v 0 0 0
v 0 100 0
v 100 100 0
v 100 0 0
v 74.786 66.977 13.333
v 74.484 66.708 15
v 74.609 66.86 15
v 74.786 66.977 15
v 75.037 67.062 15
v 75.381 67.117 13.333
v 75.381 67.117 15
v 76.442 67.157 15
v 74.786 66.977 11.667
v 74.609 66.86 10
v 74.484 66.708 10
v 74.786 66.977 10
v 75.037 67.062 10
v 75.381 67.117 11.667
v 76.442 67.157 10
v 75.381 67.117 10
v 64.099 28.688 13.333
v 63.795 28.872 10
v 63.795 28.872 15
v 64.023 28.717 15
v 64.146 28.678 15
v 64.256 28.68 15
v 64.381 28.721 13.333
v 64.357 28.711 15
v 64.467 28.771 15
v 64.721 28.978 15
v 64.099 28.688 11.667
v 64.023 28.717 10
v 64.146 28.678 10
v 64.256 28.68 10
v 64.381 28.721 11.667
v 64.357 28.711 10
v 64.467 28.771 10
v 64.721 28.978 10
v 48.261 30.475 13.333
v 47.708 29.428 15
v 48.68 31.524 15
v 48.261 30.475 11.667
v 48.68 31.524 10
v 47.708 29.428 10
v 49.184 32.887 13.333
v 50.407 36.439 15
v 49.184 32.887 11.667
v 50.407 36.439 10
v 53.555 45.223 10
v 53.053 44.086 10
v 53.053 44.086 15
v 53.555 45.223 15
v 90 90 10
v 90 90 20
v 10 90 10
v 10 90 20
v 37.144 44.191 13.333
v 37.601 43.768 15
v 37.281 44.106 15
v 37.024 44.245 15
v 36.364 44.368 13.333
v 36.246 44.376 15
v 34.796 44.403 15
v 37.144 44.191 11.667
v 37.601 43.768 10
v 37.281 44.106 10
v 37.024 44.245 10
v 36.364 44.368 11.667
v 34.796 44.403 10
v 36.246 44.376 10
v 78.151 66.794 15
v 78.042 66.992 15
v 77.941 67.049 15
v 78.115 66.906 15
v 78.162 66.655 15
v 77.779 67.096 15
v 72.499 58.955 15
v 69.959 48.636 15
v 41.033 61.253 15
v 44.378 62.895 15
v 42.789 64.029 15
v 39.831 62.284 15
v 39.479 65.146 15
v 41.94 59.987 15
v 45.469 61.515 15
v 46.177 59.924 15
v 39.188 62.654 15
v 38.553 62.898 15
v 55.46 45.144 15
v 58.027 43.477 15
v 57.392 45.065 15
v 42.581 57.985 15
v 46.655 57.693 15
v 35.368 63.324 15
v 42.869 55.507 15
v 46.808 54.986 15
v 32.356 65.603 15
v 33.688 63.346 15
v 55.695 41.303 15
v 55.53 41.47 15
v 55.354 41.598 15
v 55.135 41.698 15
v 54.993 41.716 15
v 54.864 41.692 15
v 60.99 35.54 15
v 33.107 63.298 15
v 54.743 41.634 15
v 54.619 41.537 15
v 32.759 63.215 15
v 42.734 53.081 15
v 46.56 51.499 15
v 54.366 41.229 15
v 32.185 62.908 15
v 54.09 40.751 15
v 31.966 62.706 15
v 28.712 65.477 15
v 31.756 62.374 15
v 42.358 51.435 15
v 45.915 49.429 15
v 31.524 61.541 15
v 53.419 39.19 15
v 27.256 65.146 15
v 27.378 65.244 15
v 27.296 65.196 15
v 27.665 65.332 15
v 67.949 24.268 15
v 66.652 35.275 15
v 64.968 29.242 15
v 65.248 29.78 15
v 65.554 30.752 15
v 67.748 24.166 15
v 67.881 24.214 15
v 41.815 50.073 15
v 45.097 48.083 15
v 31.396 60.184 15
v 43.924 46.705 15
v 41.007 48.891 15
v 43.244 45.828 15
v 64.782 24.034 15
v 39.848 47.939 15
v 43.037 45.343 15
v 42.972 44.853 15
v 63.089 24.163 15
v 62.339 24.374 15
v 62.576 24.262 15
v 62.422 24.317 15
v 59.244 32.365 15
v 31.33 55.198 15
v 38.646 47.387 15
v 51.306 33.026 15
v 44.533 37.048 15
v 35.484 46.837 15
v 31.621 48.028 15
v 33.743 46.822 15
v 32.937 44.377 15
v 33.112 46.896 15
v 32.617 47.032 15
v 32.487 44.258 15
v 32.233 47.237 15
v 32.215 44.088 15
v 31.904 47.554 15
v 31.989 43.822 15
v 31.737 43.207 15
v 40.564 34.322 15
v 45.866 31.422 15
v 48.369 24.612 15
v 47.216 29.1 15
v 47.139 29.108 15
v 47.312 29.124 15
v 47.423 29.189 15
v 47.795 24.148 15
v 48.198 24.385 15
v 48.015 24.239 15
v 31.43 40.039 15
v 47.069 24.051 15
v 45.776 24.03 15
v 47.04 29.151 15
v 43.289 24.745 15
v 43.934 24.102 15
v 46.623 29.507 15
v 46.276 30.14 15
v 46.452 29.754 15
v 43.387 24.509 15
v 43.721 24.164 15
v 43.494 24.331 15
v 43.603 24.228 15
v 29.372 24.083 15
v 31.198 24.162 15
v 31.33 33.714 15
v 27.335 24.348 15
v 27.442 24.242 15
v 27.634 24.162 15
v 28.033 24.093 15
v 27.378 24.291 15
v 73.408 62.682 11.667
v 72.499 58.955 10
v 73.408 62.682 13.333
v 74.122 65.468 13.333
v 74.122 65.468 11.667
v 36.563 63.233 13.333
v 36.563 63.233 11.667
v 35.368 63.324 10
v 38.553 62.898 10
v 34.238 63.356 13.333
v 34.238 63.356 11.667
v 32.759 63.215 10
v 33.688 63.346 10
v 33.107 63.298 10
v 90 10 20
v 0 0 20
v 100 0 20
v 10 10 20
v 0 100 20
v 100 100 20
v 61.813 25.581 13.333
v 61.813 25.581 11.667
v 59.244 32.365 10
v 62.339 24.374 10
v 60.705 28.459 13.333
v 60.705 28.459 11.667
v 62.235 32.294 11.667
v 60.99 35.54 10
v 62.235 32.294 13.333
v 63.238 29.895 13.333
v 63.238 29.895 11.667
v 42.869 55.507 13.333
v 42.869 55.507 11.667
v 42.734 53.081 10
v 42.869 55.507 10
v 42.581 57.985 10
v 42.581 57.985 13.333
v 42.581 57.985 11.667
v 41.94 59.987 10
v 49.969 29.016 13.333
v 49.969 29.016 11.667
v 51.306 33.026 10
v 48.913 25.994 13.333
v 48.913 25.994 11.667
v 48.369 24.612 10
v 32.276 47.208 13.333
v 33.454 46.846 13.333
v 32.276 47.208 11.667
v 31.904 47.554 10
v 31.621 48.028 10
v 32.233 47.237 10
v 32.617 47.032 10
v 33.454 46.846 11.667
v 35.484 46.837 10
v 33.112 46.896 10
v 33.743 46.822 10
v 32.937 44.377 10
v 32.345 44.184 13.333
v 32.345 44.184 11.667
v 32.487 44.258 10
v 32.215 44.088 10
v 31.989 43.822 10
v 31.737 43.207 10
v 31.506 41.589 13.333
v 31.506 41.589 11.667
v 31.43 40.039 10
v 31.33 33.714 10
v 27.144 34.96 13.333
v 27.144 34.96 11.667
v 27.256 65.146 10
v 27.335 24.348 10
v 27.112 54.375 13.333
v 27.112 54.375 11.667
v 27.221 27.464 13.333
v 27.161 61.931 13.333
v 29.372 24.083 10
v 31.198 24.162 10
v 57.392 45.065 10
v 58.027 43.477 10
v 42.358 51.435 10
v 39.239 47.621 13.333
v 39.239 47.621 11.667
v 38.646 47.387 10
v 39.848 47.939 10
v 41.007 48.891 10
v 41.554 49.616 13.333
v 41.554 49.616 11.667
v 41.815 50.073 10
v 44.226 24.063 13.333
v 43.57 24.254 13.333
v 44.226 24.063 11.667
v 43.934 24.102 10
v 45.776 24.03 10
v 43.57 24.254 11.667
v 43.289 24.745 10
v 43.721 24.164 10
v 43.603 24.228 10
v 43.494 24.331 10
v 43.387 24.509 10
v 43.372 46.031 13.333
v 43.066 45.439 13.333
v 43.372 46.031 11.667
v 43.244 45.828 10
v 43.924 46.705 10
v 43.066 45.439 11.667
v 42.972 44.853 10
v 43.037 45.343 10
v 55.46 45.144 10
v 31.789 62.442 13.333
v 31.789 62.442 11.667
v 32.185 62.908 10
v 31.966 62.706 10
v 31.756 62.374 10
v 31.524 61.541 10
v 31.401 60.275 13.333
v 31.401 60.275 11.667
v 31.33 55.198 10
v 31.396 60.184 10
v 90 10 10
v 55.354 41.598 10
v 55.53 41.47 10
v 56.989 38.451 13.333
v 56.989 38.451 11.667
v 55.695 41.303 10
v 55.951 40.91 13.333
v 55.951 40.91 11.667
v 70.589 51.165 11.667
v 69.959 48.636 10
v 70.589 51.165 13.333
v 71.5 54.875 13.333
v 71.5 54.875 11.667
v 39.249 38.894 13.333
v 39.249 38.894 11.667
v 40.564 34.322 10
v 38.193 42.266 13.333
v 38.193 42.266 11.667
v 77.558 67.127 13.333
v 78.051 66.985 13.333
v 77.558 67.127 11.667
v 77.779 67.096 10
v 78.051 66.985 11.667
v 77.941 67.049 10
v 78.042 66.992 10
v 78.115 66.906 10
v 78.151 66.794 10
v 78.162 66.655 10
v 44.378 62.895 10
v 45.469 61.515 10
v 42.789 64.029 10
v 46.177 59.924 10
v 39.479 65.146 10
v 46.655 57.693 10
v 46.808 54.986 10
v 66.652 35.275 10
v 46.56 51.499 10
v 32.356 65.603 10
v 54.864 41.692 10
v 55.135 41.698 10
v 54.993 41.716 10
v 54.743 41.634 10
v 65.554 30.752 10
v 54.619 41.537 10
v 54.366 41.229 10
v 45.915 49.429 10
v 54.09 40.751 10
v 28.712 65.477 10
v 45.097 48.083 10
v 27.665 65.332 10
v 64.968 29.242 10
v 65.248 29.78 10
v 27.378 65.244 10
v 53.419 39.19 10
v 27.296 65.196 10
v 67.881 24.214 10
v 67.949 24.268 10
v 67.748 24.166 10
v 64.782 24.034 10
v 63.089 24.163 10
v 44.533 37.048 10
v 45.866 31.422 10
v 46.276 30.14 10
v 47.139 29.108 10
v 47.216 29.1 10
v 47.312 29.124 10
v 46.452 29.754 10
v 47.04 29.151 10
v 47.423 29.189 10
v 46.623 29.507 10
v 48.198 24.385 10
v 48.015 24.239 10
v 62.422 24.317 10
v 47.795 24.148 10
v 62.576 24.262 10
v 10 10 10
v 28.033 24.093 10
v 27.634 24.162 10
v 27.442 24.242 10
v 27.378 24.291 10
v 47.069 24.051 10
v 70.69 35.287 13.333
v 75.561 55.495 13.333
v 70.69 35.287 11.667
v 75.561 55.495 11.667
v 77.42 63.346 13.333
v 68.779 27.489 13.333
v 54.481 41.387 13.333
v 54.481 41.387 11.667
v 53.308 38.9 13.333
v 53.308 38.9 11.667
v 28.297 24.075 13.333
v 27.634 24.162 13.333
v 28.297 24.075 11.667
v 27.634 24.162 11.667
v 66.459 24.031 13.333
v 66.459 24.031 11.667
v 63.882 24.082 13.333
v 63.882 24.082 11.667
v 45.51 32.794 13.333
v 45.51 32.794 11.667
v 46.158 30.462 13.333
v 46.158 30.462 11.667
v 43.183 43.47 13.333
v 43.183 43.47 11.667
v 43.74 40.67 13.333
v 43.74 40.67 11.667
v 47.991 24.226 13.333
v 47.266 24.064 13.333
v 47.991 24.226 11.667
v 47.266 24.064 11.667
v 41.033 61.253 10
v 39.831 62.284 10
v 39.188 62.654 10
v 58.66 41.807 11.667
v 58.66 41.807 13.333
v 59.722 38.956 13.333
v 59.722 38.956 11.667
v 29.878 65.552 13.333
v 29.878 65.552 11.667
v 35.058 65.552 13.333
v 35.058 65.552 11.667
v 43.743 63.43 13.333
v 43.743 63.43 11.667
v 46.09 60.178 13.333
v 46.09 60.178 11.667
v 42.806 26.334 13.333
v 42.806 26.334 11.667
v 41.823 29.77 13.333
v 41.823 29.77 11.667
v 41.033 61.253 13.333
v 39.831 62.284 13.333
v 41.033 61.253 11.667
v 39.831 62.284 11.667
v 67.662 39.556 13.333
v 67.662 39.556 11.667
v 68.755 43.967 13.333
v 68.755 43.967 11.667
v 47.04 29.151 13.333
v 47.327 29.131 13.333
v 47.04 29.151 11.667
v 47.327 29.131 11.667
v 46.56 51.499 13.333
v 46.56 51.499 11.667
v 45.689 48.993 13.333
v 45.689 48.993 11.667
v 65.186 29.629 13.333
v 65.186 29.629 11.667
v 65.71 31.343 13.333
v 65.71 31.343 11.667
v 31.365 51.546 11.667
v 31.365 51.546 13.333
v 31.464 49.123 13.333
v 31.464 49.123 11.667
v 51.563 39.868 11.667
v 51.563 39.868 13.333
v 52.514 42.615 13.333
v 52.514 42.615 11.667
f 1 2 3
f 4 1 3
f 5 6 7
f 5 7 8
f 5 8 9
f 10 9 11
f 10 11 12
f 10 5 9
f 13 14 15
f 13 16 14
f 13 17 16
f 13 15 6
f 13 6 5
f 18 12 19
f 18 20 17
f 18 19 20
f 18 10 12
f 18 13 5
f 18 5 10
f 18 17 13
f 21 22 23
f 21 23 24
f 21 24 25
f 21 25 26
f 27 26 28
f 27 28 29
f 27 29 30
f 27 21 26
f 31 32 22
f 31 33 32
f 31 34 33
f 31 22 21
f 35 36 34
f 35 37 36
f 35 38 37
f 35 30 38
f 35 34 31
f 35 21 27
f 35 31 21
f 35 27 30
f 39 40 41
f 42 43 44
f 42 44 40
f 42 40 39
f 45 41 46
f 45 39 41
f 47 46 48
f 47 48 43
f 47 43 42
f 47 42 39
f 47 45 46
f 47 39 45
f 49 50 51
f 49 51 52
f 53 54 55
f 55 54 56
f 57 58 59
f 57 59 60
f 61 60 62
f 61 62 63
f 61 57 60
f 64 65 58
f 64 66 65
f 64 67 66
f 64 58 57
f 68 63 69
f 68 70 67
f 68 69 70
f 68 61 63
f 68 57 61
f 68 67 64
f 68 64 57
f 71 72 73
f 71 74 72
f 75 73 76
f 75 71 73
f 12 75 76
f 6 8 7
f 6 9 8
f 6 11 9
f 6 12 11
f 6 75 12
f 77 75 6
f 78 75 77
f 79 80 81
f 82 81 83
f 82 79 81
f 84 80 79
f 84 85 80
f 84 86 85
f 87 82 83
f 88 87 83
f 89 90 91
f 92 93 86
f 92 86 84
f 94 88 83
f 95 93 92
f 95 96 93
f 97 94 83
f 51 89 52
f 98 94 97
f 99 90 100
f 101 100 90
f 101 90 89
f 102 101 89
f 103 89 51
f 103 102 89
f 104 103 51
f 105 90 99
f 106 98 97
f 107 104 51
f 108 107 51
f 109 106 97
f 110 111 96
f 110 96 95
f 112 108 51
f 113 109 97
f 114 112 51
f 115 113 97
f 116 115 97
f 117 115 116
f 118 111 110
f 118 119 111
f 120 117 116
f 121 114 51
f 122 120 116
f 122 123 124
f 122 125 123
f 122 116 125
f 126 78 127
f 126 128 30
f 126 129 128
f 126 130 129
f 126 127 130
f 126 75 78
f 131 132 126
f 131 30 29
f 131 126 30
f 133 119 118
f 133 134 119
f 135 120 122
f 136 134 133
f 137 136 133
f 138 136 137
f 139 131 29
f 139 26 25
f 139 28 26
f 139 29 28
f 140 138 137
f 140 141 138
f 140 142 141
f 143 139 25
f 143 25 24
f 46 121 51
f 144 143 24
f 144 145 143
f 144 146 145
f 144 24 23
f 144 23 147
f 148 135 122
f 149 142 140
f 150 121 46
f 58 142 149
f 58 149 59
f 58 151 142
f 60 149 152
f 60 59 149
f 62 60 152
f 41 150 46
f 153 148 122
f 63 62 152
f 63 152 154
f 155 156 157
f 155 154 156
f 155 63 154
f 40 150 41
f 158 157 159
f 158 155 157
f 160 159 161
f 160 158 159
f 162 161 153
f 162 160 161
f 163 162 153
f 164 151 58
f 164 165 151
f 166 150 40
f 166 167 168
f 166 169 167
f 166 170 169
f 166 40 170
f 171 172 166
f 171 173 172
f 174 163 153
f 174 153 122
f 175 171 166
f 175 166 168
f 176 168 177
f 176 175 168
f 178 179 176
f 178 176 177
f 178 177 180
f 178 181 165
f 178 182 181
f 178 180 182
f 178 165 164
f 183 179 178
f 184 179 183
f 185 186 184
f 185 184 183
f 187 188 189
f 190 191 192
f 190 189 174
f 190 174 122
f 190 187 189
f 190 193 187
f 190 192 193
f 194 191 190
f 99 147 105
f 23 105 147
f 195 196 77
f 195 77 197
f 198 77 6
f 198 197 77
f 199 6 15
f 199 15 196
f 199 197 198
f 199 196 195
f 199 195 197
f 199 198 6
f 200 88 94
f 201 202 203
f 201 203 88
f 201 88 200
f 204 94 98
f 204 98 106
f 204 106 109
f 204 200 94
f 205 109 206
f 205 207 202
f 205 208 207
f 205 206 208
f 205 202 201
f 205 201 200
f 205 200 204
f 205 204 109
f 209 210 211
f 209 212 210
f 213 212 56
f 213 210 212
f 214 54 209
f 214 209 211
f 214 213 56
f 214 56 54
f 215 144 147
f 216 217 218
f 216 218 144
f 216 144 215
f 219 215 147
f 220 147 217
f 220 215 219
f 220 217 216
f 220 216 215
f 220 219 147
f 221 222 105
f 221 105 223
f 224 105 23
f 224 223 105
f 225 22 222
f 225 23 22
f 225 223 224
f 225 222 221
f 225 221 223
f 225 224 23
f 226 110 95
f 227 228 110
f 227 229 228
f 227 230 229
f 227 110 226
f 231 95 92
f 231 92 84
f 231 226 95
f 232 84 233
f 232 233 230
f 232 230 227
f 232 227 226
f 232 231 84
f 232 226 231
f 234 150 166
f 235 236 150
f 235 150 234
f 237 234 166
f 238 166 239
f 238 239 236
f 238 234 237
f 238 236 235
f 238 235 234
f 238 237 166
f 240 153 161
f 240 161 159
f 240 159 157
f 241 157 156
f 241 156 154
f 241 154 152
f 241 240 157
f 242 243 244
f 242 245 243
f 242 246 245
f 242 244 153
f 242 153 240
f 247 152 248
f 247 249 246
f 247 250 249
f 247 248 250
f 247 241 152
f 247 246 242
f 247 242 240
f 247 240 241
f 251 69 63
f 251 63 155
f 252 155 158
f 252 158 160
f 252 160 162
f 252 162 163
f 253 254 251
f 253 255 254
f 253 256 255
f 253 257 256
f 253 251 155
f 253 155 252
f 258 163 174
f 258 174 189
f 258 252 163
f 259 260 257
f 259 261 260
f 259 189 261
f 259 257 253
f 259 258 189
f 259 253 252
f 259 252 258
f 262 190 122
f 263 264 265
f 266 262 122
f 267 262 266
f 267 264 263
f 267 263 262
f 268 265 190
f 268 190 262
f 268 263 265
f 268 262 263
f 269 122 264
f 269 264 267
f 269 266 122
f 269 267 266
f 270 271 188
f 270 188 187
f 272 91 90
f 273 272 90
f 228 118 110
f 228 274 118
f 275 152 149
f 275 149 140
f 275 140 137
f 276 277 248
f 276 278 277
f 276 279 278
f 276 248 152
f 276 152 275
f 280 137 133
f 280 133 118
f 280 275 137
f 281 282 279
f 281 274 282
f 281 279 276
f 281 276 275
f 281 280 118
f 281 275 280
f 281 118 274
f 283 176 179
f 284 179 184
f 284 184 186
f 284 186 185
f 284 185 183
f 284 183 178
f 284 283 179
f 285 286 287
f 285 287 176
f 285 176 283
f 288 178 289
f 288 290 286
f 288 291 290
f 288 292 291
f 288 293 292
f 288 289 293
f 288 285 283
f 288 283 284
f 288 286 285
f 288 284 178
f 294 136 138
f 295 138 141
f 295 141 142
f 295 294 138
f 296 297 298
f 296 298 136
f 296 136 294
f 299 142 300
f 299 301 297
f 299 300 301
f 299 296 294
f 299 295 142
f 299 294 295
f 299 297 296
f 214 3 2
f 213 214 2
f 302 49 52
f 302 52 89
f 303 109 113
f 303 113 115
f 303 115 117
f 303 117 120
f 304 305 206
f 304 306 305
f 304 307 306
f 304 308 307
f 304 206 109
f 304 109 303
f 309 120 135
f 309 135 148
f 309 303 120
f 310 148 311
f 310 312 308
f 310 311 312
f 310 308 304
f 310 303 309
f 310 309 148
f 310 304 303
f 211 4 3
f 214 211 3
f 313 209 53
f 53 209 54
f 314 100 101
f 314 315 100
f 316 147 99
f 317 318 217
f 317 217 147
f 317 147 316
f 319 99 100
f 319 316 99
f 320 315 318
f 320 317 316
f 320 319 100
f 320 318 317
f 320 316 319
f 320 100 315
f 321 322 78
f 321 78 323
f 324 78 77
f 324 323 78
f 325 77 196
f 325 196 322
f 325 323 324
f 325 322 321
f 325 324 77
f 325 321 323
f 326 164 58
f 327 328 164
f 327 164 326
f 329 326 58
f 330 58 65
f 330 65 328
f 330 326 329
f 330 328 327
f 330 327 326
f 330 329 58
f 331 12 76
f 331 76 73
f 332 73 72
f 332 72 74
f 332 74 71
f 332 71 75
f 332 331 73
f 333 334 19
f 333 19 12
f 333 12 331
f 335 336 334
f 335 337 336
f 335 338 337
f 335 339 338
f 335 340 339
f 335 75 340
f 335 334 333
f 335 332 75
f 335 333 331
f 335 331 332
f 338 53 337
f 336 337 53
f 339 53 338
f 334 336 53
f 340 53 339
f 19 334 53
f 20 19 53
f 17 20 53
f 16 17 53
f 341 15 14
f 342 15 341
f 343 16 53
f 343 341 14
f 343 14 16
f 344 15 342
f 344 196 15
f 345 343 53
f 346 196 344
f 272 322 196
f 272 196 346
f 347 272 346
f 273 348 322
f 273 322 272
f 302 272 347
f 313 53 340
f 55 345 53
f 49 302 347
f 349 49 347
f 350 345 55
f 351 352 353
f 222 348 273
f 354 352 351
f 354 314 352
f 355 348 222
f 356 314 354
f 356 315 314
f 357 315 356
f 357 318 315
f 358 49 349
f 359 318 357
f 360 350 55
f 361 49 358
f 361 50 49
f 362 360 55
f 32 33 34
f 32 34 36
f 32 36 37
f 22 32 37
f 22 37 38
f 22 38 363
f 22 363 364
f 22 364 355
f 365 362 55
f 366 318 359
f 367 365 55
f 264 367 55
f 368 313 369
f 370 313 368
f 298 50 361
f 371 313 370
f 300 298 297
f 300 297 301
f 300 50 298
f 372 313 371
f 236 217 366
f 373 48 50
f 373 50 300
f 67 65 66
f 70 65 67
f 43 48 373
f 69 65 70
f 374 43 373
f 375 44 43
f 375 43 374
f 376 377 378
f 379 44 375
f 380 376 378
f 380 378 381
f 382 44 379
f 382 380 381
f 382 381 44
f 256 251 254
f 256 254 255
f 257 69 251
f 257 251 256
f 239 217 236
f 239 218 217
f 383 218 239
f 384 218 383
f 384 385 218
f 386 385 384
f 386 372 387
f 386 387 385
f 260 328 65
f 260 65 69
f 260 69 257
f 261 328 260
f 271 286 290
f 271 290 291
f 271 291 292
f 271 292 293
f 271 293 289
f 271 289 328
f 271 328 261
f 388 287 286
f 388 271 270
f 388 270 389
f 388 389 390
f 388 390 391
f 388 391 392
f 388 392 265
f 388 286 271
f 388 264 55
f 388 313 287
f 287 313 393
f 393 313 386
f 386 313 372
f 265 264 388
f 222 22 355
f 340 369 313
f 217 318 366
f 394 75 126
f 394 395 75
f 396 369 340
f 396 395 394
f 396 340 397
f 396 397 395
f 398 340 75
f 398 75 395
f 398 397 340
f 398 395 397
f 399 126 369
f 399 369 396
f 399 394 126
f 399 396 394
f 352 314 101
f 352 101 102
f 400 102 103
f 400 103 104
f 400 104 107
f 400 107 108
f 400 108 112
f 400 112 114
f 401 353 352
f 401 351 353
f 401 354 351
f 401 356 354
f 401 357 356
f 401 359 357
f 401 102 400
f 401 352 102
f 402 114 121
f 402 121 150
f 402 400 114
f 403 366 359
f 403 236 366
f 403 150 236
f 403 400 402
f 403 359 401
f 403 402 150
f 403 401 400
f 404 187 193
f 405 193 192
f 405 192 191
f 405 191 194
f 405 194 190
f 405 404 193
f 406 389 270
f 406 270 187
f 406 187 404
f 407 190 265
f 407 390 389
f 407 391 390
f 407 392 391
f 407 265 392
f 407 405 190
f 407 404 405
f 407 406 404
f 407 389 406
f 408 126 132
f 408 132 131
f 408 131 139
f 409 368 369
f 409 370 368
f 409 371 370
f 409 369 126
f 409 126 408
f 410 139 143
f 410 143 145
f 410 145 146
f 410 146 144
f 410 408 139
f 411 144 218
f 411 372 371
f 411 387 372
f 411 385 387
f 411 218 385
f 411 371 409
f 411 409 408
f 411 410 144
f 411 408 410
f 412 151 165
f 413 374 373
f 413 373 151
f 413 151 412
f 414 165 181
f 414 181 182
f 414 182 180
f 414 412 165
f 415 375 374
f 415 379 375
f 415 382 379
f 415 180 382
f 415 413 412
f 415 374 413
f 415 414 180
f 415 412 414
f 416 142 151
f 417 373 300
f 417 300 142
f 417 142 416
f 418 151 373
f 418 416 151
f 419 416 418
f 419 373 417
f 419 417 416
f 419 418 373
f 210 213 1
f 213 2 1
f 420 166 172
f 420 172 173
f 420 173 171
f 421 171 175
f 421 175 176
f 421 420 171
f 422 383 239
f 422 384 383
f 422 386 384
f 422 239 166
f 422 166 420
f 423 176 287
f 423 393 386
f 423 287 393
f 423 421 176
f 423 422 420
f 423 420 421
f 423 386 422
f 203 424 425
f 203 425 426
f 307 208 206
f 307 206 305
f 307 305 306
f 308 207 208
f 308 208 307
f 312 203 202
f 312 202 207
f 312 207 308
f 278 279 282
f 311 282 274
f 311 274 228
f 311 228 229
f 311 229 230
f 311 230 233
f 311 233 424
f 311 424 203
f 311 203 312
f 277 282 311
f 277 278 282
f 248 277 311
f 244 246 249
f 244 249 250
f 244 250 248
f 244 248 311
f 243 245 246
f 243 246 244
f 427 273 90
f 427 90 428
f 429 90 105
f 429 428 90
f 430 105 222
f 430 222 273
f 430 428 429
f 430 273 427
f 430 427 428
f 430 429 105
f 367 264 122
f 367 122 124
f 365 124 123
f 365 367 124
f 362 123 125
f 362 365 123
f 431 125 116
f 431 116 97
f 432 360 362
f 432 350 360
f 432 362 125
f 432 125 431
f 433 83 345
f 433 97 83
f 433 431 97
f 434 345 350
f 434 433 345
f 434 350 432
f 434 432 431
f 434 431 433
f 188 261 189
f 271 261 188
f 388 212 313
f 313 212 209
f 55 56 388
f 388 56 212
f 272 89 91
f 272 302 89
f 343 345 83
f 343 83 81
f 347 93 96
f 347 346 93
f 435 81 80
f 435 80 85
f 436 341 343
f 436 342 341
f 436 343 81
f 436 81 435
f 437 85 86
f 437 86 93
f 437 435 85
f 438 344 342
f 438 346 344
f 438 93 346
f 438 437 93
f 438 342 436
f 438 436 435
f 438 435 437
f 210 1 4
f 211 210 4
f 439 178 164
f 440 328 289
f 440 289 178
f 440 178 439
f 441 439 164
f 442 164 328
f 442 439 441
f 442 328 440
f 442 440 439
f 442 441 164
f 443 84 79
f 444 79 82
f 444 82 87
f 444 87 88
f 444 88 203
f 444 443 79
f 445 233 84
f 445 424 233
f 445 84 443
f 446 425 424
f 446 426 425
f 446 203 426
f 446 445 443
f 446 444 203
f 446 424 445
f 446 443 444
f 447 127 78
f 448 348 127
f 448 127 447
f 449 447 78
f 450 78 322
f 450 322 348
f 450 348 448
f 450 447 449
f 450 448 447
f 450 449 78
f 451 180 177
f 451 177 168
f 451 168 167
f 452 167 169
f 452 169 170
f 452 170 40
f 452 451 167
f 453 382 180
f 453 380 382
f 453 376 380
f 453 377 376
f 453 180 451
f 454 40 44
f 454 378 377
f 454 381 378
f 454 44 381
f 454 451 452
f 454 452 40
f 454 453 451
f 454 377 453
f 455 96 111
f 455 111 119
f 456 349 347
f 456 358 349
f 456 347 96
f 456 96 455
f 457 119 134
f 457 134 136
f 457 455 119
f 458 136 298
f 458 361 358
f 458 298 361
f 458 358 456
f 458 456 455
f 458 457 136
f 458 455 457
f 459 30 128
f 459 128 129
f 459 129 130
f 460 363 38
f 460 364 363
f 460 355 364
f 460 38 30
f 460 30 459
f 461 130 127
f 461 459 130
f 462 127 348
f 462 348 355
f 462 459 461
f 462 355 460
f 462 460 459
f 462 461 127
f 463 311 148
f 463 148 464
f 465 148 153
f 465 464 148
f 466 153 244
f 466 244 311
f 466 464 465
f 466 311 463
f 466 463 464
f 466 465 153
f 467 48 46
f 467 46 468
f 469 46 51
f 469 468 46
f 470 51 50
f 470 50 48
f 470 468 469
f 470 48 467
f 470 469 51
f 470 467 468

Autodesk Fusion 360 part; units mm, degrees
sketch "Sketch2" plane through (0, 0, 0) normal (0, 0, 1) x (1, 0, 0)
  line L0 (0, 0) -> (100, 0)
  line L1 (100, 0) -> (100, 100)
  line L2 (100, 100) -> (0, 100)
  line L3 (0, 100) -> (0, 0)
extrude "Extrude3" add sketch "Sketch2" along normal blind 20
sketch "Sketch3" plane through (0, 0, 20) normal (0, 0, 1) x (-1, 0, 0)
  line L0 (0, -100) -> (0, 0)
  line L1 (0, 0) -> (-100, 0)
  line L2 (-100, 0) -> (-100, -100)
  line L3 (-100, -100) -> (0, -100)
  line L4 (-10, -10) -> (-90, -10)
  line L5 (-90, -10) -> (-90, -90)
  line L6 (-90, -90) -> (-10, -90)
  line L7 (-10, -90) -> (-10, -10)
extrude "Extrude4" cut sketch "Sketch3" against normal blind 10 contours L4 L5 L6 L7
sketch "Sketch4" plane through (0, 0, 10) normal (0, 0, 1) x (-1, 0, 0)
  line L0 (-10, -90) -> (-10, -10)
  line L1 (-10, -10) -> (-90, -10)
  line L2 (-90, -10) -> (-90, -90)
  line L3 (-90, -90) -> (-10, -90)
  spline S0 degree 3 poles (-75.4628, -68.295) (-73.8753, -68.1891) (-73.6636, -68.1362) (-73.5313, -67.6071) knots 0 0 0 0 1 1 1 1
  spline S1 degree 3 poles (-73.5313, -67.6071) (-72.473, -63.0562) (-68.3455, -46.4404) (-68.1338, -45.8583) knots 0 0 0 0 1 1 1 1
  spline S2 degree 3 poles (-68.1338, -45.8583) (-67.7369, -44.7471) (-64.7736, -31.8618) (-64.5355, -30.3008) knots 0 0 0 0 1 1 1 1
  spline S3 degree 3 poles (-64.5355, -30.3008) (-64.3503, -28.8456) (-64.0063, -28.8456) (-63.8211, -30.3273) knots 0 0 0 0 1 1 1 1
  spline S4 degree 3 poles (-63.8211, -30.3273) (-63.7417, -30.8829) (-62.4453, -34.6929) (-60.9371, -38.7939) knots 0 0 0 0 1 1 1 1
  line L4 (-60.9371, -38.7939) -> (-58.1855, -46.2552)
  line L5 (-58.1855, -46.2552) -> (-55.4073, -46.2552)
  line L6 (-55.4073, -46.2552) -> (-52.6028, -46.2552)
  line L7 (-52.6028, -46.2552) -> (-50.0363, -38.4764)
  spline S5 degree 3 poles (-50.0363, -38.4764) (-48.634, -34.2166) (-47.4698, -30.4596) (-47.4698, -30.1421) knots 0 0 0 0 1 1 1 1
  spline S6 degree 3 poles (-47.4698, -30.1421) (-47.4698, -29.0308) (-46.9936, -29.6129) (-46.8348, -30.9887) knots 0 0 0 0 1 1 1 1
  spline S7 degree 3 poles (-46.8348, -30.9887) (-46.729, -31.7296) (-45.9882, -35.275) (-45.1944, -38.8204) knots 0 0 0 0 1 1 1 1
  line L8 (-45.1944, -38.8204) -> (-43.7657, -45.2762)
  line L9 (-43.7657, -45.2762) -> (-44.824, -46.1758)
  spline S8 degree 3 poles (-44.824, -46.1758) (-46.3057, -47.4723) (-47.1523, -49.0333) (-47.6021, -51.4146) knots 0 0 0 0 1 1 1 1
  spline S9 degree 3 poles (-47.6021, -51.4146) (-48.0784, -53.7958) (-48.1048, -55.8066) (-47.708, -58.1614) knots 0 0 0 0 1 1 1 1
  spline S10 degree 3 poles (-47.708, -58.1614) (-47.1788, -61.5216) (-45.7765, -63.6648) (-43.263, -65.0141) knots 0 0 0 0 1 1 1 1
  spline S11 degree 3 poles (-43.263, -65.0141) (-40.8288, -66.3106) (-38.5269, -66.6281) (-31.833, -66.6281) knots 0 0 0 0 1 1 1 1
  line L10 (-31.833, -66.6281) -> (-26.0386, -66.6281)
  line L11 (-26.0386, -66.6281) -> (-26.0386, -44.8)
  line L12 (-26.0386, -44.8) -> (-26.0386, -22.9718)
  line L13 (-26.0386, -22.9718) -> (-29.2136, -22.9718)
  line L14 (-29.2136, -22.9718) -> (-32.3886, -22.9718)
  line L15 (-32.3886, -22.9718) -> (-32.3886, -33.2377)
  line L16 (-32.3886, -33.2377) -> (-32.3886, -43.4771)
  line L17 (-32.3886, -43.4771) -> (-34.6905, -43.4241)
  line L18 (-34.6905, -43.4241) -> (-36.9659, -43.3712)
  line L19 (-36.9659, -43.3712) -> (-39.7969, -33.2377)
  line L20 (-39.7969, -33.2377) -> (-42.6015, -23.1041)
  line L21 (-42.6015, -23.1041) -> (-45.803, -23.0248)
  line L22 (-45.803, -23.0248) -> (-48.978, -22.9454)
  line L23 (-48.978, -22.9454) -> (-51.6503, -30.83)
  spline S12 degree 3 poles (-51.6503, -30.83) (-53.1319, -35.1691) (-54.4019, -39.085) (-54.5078, -39.5083) knots 0 0 0 0 1 1 1 1
  spline S13 degree 3 poles (-54.5078, -39.5083) (-54.8517, -41.1752) (-54.9311, -41.3339) (-55.1692, -40.9371) knots 0 0 0 0 1 1 1 1
  spline S14 degree 3 poles (-55.1692, -40.9371) (-55.3015, -40.7254) (-55.4073, -40.355) (-55.4073, -40.0904) knots 0 0 0 0 1 1 1 1
  spline S15 degree 3 poles (-55.4073, -40.0904) (-55.4073, -39.8258) (-56.8096, -35.8835) (-58.503, -31.3062) knots 0 0 0 0 1 1 1 1
  line L24 (-58.503, -31.3062) -> (-61.5986, -22.9983)
  line L25 (-61.5986, -22.9983) -> (-65.144, -22.9189)
  spline S16 degree 3 poles (-65.144, -22.9189) (-67.1019, -22.866) (-68.7159, -22.8925) (-68.7688, -22.9718) knots 0 0 0 0 1 1 1 1
  spline S17 degree 3 poles (-68.7688, -22.9718) (-68.8482, -23.1306) (-79.749, -68.1098) (-79.749, -68.3214) knots 0 0 0 0 1 1 1 1
  spline S18 degree 3 poles (-79.749, -68.3214) (-79.749, -68.4802) (-79.0346, -68.4802) (-75.4628, -68.295) knots 0 0 0 0 1 1 1 1
  spline S19 degree 3 poles (-78.1615, -66.6546) (-78.1615, -66.0989) (-68.1603, -24.6123) (-67.9486, -24.2683) knots 0 0 0 0 1 1 1 1
  spline S20 degree 3 poles (-67.9486, -24.2683) (-67.7105, -23.8714) (-62.6569, -23.9773) (-62.3394, -24.3741) knots 0 0 0 0 1 1 1 1
  spline S21 degree 3 poles (-62.3394, -24.3741) (-62.1807, -24.5329) (-60.8048, -28.1577) (-59.2438, -32.3646) knots 0 0 0 0 1 1 1 1
  spline S22 degree 3 poles (-59.2438, -32.3646) (-56.1217, -40.8841) (-55.9894, -41.1752) (-55.3544, -41.5985) knots 0 0 0 0 1 1 1 1
  spline S23 degree 3 poles (-55.3544, -41.5985) (-54.4548, -42.1541) (-53.8992, -40.9635) (-51.3063, -33.026) knots 0 0 0 0 1 1 1 1
  spline S24 degree 3 poles (-51.3063, -33.026) (-49.904, -28.7398) (-48.5811, -24.9562) (-48.3694, -24.6123) knots 0 0 0 0 1 1 1 1
  spline S25 degree 3 poles (-48.3694, -24.6123) (-48.0255, -24.0831) (-47.7873, -24.0302) (-45.7765, -24.0302) knots 0 0 0 0 1 1 1 1
  spline S26 degree 3 poles (-45.7765, -24.0302) (-43.6069, -24.0302) (-43.554, -24.0566) (-43.2894, -24.7446) knots 0 0 0 0 1 1 1 1
  spline S27 degree 3 poles (-43.2894, -24.7446) (-43.1307, -25.1679) (-41.8871, -29.4541) (-40.5642, -34.3225) knots 0 0 0 0 1 1 1 1
  spline S28 degree 3 poles (-40.5642, -34.3225) (-39.1884, -39.2702) (-37.8919, -43.4241) (-37.6009, -43.7681) knots 0 0 0 0 1 1 1 1
  spline S29 degree 3 poles (-37.6009, -43.7681) (-37.1511, -44.3502) (-36.913, -44.4031) (-34.7963, -44.4031) knots 0 0 0 0 1 1 1 1
  spline S30 degree 3 poles (-34.7963, -44.4031) (-31.2244, -44.4031) (-31.489, -45.1968) (-31.3303, -33.7139) knots 0 0 0 0 1 1 1 1
  line L26 (-31.3303, -33.7139) -> (-31.198, -24.1625)
  line L27 (-31.198, -24.1625) -> (-29.3723, -24.0831)
  spline S31 degree 3 poles (-29.3723, -24.0831) (-28.0759, -24.0302) (-27.4673, -24.1096) (-27.3351, -24.3477) knots 0 0 0 0 1 1 1 1
  spline S32 degree 3 poles (-27.3351, -24.3477) (-27.0705, -24.7446) (-27.0176, -64.5114) (-27.2557, -65.1464) knots 0 0 0 0 1 1 1 1
  spline S33 degree 3 poles (-27.2557, -65.1464) (-27.4938, -65.755) (-36.5426, -65.755) (-39.4794, -65.1464) knots 0 0 0 0 1 1 1 1
  spline S34 degree 3 poles (-39.4794, -65.1464) (-44.7976, -64.0616) (-46.8084, -61.2835) (-46.8084, -54.9864) knots 0 0 0 0 1 1 1 1
  spline S35 degree 3 poles (-46.8084, -54.9864) (-46.7819, -50.7531) (-46.2263, -49.1391) (-43.9244, -46.705) knots 0 0 0 0 1 1 1 1
  spline S36 degree 3 poles (-43.9244, -46.705) (-43.2365, -45.9641) (-42.9719, -45.4614) (-42.9719, -44.8529) knots 0 0 0 0 1 1 1 1
  spline S37 degree 3 poles (-42.9719, -44.8529) (-42.9719, -44.3766) (-43.6598, -40.8841) (-44.533, -37.0477) knots 0 0 0 0 1 1 1 1
  spline S38 degree 3 poles (-44.533, -37.0477) (-45.7236, -31.6502) (-46.1998, -29.9568) (-46.6232, -29.5071) knots 0 0 0 0 1 1 1 1
  spline S39 degree 3 poles (-46.6232, -29.5071) (-47.1788, -28.9779) (-47.2053, -28.9779) (-47.708, -29.4277) knots 0 0 0 0 1 1 1 1
  spline S40 degree 3 poles (-47.708, -29.4277) (-48.0519, -29.7187) (-49.0573, -32.391) (-50.4067, -36.4391) knots 0 0 0 0 1 1 1 1
  spline S41 degree 3 poles (-50.4067, -36.4391) (-51.5973, -40.011) (-52.788, -43.4506) (-53.0526, -44.0856) knots 0 0 0 0 1 1 1 1
  line L28 (-53.0526, -44.0856) -> (-53.5553, -45.2233)
  line L29 (-53.5553, -45.2233) -> (-55.4603, -45.1439)
  line L30 (-55.4603, -45.1439) -> (-57.3917, -45.0646)
  line L31 (-57.3917, -45.0646) -> (-58.0267, -43.4771)
  spline S42 degree 3 poles (-58.0267, -43.4771) (-58.3707, -42.6039) (-59.6936, -39.0321) (-60.9901, -35.5396) knots 0 0 0 0 1 1 1 1
  spline S43 degree 3 poles (-60.9901, -35.5396) (-62.2865, -32.0471) (-63.5301, -29.0308) (-63.7946, -28.8721) knots 0 0 0 0 1 1 1 1
  spline S44 degree 3 poles (-63.7946, -28.8721) (-64.1386, -28.581) (-64.3238, -28.6075) (-64.7207, -28.9779) knots 0 0 0 0 1 1 1 1
  spline S45 degree 3 poles (-64.7207, -28.9779) (-65.2763, -29.4806) (-65.3821, -29.851) (-66.6521, -35.275) knots 0 0 0 0 1 1 1 1
  spline S46 degree 3 poles (-66.6521, -35.275) (-67.6311, -39.5348) (-68.6894, -43.7946) (-69.9594, -48.6364) knots 0 0 0 0 1 1 1 1
  spline S47 degree 3 poles (-69.9594, -48.6364) (-70.3828, -50.3033) (-71.5205, -54.96) (-72.4994, -58.9552) knots 0 0 0 0 1 1 1 1
  spline S48 degree 3 poles (-72.4994, -58.9552) (-73.4519, -62.9504) (-74.3515, -66.4429) (-74.4838, -66.7075) knots 0 0 0 0 1 1 1 1
  spline S49 degree 3 poles (-74.4838, -66.7075) (-74.6955, -67.0514) (-75.0923, -67.1573) (-76.4417, -67.1573) knots 0 0 0 0 1 1 1 1
  spline S50 degree 3 poles (-76.4417, -67.1573) (-77.9498, -67.1573) (-78.1615, -67.1043) (-78.1615, -66.6546) knots 0 0 0 0 1 1 1 1
  spline S51 degree 3 poles (-32.759, -63.215) (-31.4096, -62.6329) (-31.3303, -62.236) (-31.3303, -55.1981) knots 0 0 0 0 1 1 1 1
  spline S52 degree 3 poles (-31.3303, -55.1981) (-31.3303, -50.9648) (-31.4361, -48.4248) (-31.6213, -48.0279) knots 0 0 0 0 1 1 1 1
  spline S53 degree 3 poles (-31.6213, -48.0279) (-32.124, -46.9431) (-32.9178, -46.705) (-35.4842, -46.8373) knots 0 0 0 0 1 1 1 1
  spline S54 degree 3 poles (-35.4842, -46.8373) (-40.0615, -47.1018) (-42.0194, -48.7952) (-42.7338, -53.0814) knots 0 0 0 0 1 1 1 1
  spline S55 degree 3 poles (-42.7338, -53.0814) (-43.1042, -55.3039) (-42.7338, -58.3996) (-41.9401, -59.9871) knots 0 0 0 0 1 1 1 1
  spline S56 degree 3 poles (-41.9401, -59.9871) (-41.2521, -61.31) (-39.7969, -62.5535) (-38.5534, -62.8975) knots 0 0 0 0 1 1 1 1
  spline S57 degree 3 poles (-38.5534, -62.8975) (-37.1246, -63.3208) (-33.4205, -63.506) (-32.759, -63.215) knots 0 0 0 0 1 1 1 1
  spline S58 degree 3 poles (-38.2359, -61.8656) (-39.6911, -61.4687) (-40.9876, -60.1723) (-41.4109, -58.6641) knots 0 0 0 0 1 1 1 1
  spline S59 degree 3 poles (-41.4109, -58.6641) (-41.5961, -58.0291) (-41.7548, -56.3093) (-41.7548, -54.8277) knots 0 0 0 0 1 1 1 1
  spline S60 degree 3 poles (-41.7548, -54.8277) (-41.7548, -52.5523) (-41.649, -51.9966) (-41.0934, -50.8589) knots 0 0 0 0 1 1 1 1
  spline S61 degree 3 poles (-41.0934, -50.8589) (-40.0351, -48.7158) (-38.0771, -47.8427) (-34.2407, -47.8427) knots 0 0 0 0 1 1 1 1
  line L32 (-34.2407, -47.8427) -> (-32.3886, -47.8427)
  line L33 (-32.3886, -47.8427) -> (-32.3886, -55.0923)
  line L34 (-32.3886, -55.0923) -> (-32.3886, -62.3418)
  line L35 (-32.3886, -62.3418) -> (-34.7434, -62.2625)
  spline S62 degree 3 poles (-34.7434, -62.2625) (-36.0398, -62.2096) (-37.6009, -62.0243) (-38.2359, -61.8656) knots 0 0 0 0 1 1 1 1
extrude "Extrude5" add sketch "Sketch4" along normal blind 5 contours S19 S20 S21 S22 S23 S24 S25 S26 S27 S28 S29 S30 L26 L27 S31 S32 S33 S34 S35 S36 S37 S38 S39 S40 S41 L28 L29 L30 L31 S42 S43 S44 S45 S46 S47 S48 S49 S50
